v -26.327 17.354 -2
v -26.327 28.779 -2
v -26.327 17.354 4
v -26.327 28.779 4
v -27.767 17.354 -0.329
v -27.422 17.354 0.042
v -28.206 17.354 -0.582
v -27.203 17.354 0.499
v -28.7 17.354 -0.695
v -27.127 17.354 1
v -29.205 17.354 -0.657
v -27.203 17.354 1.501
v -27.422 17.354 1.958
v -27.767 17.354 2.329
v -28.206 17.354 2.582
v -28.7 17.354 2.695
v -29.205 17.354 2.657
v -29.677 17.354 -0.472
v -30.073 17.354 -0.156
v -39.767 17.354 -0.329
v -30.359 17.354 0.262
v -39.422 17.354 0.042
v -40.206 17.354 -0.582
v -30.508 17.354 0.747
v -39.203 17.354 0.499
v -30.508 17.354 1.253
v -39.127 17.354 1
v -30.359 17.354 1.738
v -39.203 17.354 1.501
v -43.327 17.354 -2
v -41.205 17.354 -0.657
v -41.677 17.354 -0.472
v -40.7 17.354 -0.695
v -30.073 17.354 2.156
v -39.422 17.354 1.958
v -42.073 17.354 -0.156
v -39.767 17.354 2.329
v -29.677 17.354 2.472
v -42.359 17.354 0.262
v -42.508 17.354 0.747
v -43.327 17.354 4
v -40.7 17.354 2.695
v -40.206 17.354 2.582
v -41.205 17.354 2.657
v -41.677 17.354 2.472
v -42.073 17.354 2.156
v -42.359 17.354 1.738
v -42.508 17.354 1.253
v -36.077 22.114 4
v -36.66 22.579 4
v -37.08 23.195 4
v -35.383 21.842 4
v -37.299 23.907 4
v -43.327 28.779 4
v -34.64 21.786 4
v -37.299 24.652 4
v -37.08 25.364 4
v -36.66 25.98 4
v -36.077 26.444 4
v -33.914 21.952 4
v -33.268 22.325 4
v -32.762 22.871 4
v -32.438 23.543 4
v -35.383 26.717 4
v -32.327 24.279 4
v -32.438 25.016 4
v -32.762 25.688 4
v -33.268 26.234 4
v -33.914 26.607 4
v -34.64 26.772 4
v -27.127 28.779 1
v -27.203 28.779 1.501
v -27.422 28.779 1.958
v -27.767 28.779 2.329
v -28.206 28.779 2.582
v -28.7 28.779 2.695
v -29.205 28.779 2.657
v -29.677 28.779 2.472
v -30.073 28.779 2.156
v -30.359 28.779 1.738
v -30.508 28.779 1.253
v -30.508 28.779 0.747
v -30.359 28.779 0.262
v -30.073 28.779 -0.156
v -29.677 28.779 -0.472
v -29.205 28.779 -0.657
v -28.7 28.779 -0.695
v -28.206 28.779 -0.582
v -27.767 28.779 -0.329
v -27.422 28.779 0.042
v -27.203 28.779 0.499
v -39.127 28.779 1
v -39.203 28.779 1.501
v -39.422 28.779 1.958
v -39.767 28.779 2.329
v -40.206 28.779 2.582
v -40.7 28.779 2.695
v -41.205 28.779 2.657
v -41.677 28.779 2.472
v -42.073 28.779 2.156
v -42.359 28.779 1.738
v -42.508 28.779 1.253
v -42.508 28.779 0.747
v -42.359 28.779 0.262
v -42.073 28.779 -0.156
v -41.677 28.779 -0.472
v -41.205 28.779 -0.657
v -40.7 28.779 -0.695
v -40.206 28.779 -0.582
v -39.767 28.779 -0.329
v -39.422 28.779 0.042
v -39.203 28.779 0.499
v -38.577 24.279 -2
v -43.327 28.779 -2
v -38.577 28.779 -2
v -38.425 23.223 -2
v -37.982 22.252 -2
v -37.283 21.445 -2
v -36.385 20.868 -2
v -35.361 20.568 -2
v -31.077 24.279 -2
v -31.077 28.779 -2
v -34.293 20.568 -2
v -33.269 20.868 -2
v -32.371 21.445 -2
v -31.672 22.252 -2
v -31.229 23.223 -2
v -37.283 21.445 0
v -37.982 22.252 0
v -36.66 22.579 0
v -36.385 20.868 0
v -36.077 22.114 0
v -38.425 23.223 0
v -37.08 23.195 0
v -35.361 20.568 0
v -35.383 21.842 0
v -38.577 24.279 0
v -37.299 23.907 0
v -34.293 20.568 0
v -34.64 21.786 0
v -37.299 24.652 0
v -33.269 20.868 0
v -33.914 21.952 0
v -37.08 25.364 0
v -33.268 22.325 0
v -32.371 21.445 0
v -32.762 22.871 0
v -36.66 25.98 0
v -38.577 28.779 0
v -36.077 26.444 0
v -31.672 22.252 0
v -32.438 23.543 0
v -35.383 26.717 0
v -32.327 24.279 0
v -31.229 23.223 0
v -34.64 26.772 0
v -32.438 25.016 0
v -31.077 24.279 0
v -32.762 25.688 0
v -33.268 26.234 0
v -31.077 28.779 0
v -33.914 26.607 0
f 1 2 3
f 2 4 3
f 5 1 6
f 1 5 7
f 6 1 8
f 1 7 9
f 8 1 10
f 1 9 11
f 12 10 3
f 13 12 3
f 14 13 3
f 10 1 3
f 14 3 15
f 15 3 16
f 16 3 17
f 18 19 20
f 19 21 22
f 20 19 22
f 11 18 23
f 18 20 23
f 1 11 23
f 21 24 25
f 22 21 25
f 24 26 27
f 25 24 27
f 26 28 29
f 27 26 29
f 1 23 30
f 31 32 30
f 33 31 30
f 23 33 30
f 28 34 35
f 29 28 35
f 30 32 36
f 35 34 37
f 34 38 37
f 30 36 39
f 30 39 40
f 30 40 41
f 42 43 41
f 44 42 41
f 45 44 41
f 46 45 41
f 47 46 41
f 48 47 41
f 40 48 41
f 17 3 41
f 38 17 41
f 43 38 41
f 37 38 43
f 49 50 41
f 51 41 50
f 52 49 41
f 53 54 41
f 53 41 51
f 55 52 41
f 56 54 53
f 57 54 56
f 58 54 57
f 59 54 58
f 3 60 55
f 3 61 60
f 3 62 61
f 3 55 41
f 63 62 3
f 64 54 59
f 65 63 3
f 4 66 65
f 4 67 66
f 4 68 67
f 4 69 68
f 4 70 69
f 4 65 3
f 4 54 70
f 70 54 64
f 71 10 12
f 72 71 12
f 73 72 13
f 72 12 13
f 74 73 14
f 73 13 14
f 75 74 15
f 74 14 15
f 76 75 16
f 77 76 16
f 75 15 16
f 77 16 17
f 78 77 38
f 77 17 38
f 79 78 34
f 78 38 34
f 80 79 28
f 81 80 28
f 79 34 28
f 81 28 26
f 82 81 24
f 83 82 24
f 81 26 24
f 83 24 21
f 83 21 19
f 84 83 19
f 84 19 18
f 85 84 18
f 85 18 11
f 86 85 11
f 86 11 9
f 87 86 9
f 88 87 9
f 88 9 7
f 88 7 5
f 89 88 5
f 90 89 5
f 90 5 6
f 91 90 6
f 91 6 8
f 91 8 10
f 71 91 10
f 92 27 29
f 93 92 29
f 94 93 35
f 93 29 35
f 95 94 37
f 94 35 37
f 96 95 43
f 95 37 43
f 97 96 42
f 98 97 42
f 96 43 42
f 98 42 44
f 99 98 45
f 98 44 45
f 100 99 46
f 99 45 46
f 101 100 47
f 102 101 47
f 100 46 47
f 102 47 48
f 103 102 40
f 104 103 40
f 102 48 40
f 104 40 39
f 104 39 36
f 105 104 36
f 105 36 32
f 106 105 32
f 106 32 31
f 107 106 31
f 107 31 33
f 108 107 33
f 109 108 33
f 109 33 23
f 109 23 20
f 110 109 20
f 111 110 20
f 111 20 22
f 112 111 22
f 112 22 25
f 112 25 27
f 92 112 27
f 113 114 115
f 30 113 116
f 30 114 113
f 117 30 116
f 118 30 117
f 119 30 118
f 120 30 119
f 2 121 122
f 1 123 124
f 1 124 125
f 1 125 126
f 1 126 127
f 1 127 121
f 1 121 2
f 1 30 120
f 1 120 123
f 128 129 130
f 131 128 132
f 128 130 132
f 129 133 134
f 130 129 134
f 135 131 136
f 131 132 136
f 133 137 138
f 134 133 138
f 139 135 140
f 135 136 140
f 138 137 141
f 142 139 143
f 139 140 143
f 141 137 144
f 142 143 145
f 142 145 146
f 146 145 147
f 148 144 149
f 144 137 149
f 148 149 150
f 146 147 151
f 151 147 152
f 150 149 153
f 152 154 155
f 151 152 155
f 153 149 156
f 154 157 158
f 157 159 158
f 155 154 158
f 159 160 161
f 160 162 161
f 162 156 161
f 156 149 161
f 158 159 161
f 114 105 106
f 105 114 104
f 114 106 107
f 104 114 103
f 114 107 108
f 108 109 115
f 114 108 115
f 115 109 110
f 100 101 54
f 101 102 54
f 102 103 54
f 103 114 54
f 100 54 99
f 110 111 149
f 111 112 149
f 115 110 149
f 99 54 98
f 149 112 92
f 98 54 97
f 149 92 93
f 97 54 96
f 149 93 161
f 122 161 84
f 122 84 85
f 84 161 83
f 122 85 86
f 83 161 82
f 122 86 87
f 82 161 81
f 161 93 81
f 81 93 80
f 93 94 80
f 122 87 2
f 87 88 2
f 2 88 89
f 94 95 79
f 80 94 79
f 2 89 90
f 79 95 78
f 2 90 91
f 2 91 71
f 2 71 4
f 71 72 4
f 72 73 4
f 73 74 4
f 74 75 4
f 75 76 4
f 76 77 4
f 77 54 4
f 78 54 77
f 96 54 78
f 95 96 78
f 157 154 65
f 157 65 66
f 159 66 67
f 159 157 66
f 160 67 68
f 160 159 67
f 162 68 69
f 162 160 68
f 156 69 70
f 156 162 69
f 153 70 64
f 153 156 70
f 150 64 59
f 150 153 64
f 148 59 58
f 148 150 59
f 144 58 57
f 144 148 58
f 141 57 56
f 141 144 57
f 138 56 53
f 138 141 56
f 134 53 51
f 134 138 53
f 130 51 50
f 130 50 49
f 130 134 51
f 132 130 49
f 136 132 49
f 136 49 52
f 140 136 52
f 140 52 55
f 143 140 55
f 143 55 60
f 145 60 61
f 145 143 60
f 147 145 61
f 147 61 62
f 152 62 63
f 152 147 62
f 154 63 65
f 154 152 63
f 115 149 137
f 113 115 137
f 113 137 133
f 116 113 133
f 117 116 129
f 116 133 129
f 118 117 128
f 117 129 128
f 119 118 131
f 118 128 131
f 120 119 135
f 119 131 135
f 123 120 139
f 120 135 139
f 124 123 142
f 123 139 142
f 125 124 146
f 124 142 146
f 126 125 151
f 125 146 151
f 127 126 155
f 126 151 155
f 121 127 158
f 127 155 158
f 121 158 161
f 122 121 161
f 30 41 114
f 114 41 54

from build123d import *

# Parameters (mm, degrees)
F0_W     = 17
F0_H     = 11.425
F0_R     = 2.5
F1_DEPTH = 4
F3_DEPTH = 2
F4_R     = 1.7
F5_DEPTH = 11.426


with BuildPart() as f1:
    # F0 (on Top) → F1 (new body)
    with BuildSketch(Plane.XY):
        with Locations((-34.827103, 23.066922)):
            Rectangle(F0_W, F0_H)
        with Locations((-34.827103, 24.279422)):
            Circle(F0_R, mode=Mode.SUBTRACT)
    extrude(amount=F1_DEPTH)

    # F2 (on face) → F3 (join)
    with BuildSketch(Plane(origin=(0, 0, 0), x_dir=(1, 0, 0), z_dir=(0, 0, -1))):
        with BuildLine():
            ThreePointArc((-38.577103, -24.279422), (-34.827103, -20.529422), (-31.077103, -24.279422))
            Line((-31.077103, -24.279422), (-31.077103, -28.779422))
            Line((-31.077103, -28.779422), (-26.327103, -28.779422))
            Line((-26.327103, -28.779422), (-26.327103, -17.354422))
            Line((-26.327103, -17.354422), (-43.327103, -17.354422))
            Line((-43.327103, -17.354422), (-43.327103, -28.779422))
            Line((-43.327103, -28.779422), (-38.577103, -28.779422))
            Line((-38.577103, -28.779422), (-38.577103, -24.279422))
        make_face()
    extrude(amount=F3_DEPTH)

    # F4 (on face) → F5 (cut, through all)
    with BuildSketch(Plane.XZ.offset(-17.354422)):
        with Locations((-28.827103, 1)):
            Circle(F4_R)
        with Locations((-40.827103, 1)):
            Circle(F4_R)
    extrude(amount=-F5_DEPTH, mode=Mode.SUBTRACT)


solid = f1.part
